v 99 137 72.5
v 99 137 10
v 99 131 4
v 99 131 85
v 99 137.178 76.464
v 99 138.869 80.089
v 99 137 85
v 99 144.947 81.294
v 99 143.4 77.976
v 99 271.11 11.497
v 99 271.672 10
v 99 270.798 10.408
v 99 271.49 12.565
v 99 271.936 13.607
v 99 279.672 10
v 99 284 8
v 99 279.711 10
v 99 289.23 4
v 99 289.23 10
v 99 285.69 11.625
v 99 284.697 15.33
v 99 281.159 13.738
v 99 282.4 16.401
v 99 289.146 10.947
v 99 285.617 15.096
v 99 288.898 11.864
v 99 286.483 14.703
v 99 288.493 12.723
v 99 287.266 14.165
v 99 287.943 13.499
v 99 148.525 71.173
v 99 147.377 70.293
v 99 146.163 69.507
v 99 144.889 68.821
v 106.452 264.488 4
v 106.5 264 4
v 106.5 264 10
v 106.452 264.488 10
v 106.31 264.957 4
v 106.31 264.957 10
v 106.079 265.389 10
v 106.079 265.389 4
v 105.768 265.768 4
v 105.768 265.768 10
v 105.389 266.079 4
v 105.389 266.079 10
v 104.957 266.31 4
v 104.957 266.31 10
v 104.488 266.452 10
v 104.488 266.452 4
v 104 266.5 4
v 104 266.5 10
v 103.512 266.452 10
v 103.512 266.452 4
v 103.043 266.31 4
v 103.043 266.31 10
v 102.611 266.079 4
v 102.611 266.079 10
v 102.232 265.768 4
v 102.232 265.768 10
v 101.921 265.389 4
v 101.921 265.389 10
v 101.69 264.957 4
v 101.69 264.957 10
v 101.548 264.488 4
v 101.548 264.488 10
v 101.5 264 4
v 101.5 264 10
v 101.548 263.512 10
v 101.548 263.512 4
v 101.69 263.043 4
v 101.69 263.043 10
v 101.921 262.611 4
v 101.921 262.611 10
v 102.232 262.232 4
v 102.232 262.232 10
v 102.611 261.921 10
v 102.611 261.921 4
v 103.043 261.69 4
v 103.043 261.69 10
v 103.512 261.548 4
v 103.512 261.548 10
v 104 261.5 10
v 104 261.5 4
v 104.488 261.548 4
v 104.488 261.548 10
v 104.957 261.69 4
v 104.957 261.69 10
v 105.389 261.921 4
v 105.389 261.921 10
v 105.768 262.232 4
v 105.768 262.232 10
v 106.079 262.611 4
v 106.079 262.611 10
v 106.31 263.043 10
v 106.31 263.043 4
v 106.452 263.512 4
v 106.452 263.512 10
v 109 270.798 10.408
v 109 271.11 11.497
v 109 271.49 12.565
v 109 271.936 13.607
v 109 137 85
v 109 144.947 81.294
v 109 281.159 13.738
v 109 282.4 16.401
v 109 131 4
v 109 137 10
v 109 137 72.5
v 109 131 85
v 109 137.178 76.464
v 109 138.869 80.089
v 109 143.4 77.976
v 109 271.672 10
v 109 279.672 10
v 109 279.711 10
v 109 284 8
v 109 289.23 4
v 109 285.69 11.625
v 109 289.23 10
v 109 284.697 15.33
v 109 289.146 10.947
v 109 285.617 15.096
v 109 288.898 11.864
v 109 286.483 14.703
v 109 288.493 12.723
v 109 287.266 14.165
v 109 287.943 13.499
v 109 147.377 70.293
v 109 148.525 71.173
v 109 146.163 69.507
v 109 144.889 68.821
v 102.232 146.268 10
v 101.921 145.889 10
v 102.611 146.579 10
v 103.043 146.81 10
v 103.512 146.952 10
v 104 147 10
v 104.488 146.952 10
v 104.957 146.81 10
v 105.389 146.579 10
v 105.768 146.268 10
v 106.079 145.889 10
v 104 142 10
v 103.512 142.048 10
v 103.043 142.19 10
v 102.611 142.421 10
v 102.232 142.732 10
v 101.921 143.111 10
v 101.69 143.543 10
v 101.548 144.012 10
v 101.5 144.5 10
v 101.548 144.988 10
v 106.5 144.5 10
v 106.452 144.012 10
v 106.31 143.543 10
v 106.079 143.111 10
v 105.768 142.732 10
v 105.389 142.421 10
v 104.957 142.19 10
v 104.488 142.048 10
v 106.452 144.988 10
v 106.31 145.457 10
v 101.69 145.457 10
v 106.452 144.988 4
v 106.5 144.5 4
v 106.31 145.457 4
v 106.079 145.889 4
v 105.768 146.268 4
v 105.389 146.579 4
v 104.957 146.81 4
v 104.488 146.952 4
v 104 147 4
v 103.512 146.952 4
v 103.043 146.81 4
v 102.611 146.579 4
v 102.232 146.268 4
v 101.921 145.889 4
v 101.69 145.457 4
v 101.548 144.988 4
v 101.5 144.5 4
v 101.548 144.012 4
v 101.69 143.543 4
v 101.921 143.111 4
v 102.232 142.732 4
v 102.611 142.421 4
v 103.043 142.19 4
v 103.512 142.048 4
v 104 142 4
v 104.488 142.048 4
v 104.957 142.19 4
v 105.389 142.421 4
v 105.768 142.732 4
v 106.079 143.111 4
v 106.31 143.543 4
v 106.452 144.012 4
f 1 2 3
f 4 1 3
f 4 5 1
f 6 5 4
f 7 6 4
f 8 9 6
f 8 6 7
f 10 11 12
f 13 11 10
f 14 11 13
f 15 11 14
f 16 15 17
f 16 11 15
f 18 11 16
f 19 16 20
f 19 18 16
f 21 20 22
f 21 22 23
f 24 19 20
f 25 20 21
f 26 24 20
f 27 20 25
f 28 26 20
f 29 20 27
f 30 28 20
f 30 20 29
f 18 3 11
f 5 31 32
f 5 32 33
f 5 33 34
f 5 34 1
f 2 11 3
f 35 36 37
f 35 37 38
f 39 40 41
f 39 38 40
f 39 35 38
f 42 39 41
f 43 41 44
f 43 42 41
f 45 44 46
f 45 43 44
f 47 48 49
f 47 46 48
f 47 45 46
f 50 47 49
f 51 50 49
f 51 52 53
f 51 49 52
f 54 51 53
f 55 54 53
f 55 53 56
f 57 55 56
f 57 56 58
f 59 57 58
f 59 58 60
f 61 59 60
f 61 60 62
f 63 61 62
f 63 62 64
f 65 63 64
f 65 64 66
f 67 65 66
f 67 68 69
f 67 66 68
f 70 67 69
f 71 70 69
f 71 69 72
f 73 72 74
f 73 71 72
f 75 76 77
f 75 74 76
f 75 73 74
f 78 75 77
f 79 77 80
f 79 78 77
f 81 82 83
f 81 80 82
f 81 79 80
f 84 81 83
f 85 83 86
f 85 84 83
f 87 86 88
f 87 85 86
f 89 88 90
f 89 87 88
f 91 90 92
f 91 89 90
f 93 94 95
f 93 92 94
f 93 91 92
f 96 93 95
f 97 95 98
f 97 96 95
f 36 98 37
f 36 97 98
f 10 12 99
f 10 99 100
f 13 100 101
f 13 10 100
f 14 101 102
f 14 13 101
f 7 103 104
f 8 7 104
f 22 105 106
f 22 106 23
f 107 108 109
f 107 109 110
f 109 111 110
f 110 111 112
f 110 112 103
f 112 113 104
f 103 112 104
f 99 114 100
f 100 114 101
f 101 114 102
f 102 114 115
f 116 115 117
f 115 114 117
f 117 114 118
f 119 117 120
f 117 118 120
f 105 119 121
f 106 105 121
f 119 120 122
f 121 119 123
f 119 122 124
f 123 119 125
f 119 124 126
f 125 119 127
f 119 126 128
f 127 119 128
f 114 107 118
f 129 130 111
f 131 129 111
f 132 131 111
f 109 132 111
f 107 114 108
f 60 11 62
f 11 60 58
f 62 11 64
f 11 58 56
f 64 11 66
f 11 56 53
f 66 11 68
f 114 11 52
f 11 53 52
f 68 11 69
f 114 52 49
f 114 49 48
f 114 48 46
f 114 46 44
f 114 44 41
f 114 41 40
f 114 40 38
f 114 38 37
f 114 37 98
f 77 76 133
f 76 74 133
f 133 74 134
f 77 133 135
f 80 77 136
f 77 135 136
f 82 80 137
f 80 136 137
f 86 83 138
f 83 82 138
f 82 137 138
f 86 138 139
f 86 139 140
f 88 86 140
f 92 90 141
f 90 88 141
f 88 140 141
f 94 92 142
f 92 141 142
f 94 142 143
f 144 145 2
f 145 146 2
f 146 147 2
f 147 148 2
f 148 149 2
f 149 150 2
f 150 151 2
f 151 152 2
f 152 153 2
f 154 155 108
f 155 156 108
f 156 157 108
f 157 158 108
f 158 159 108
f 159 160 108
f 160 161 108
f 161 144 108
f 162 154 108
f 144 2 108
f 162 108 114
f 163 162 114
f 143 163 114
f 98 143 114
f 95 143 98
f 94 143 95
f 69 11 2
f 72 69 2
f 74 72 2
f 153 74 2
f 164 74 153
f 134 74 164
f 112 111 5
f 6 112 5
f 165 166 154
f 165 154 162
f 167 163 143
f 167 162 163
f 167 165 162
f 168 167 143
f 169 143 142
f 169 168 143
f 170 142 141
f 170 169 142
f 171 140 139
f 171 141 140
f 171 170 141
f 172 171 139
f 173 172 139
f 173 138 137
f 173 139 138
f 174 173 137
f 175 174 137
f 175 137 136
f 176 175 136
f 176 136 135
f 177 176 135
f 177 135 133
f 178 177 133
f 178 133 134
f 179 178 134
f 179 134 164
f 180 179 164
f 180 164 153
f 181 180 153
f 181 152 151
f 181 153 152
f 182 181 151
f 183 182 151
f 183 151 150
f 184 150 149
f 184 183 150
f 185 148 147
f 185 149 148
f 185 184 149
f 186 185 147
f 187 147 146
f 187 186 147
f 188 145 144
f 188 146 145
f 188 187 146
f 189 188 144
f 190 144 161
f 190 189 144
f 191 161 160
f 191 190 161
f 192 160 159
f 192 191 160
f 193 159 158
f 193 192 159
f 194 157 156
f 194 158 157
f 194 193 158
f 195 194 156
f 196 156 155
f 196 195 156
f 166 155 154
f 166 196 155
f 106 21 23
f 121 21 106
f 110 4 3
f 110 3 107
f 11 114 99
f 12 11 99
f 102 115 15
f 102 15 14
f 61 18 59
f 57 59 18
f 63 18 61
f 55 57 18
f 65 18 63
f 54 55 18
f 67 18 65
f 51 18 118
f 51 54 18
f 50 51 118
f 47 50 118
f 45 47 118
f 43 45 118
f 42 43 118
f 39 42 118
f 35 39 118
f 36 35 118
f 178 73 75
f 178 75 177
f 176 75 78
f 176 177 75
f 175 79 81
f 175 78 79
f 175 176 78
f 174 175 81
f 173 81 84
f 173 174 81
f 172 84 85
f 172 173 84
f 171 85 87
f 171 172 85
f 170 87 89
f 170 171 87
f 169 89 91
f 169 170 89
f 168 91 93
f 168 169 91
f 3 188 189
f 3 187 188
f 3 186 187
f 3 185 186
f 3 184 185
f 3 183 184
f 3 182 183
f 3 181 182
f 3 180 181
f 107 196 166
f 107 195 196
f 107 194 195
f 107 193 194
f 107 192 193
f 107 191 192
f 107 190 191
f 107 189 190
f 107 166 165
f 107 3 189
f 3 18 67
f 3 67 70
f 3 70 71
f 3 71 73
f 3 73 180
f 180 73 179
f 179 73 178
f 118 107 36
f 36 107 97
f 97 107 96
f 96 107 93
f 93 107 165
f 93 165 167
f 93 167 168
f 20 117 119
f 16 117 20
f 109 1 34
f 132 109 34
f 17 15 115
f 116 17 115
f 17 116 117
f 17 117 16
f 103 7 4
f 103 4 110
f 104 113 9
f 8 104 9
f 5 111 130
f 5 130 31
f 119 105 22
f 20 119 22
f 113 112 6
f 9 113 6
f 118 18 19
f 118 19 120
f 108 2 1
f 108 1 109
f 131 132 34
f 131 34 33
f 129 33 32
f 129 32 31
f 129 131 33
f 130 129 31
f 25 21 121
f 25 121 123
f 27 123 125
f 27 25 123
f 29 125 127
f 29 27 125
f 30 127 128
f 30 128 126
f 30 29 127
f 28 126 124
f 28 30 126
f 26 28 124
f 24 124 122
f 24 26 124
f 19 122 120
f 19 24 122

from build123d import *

# Parameters (mm, degrees)
CYLINDER031_R          = 2.5
CYLINDER031_DEPTH      = 14
CYLINDER030_R          = 2.5
CYLINDER030_DEPTH      = 14
BOX012_W               = 134
BOX012_H               = 152
BOX012_DEPTH           = 11
BOX012_ROLL_ANGLE      = 25.000043
BOX012_PLACEMENT_ANGLE = 180
BOX011_W               = 10
BOX011_H               = 10
BOX011_DEPTH           = 10
BOX010_W               = 140
BOX010_H               = 162
BOX010_DEPTH           = 4
BOX010_ROLL_ANGLE      = 25.000043
BOX010_PLACEMENT_ANGLE = 180
CYLINDER004_W          = 5.4
CYLINDER004_H          = 10
CYLINDER004_ANGLE      = 90
BOX009_W               = 10
BOX009_H               = 6
BOX009_DEPTH           = 25
BOX009_PLACEMENT_ANGLE = 65
BOX008_W               = 10
BOX008_H               = 6
BOX008_DEPTH           = 31.23
BOX007_W               = 10
BOX007_H               = 2
BOX007_DEPTH           = 165
BOX002_W               = 140
BOX002_H               = 162
BOX002_DEPTH           = 4
BOX002_ROLL_ANGLE      = 25.000043
BOX002_PLACEMENT_ANGLE = 180
CYLINDER001_W          = 18
CYLINDER001_H          = 10
CYLINDER001_ANGLE      = 65
CYLINDER_W             = 18
CYLINDER_H             = 10
CYLINDER_ANGLE         = 65
BOX004_W               = 10
BOX004_H               = 6
BOX004_DEPTH           = 81
BOX006_W               = 10
BOX006_H               = 6
BOX006_DEPTH           = 20
CYLINDER003_W          = 18
CYLINDER003_H          = 10
CYLINDER003_ANGLE      = 25
CYLINDER002_W          = 18
CYLINDER002_H          = 10
CYLINDER002_ANGLE      = 25
BOX043_W               = 10
BOX043_H               = 109
BOX043_DEPTH           = 4


with BuildPart() as m4s008:
    # Cylinder031 → Cylinder031 (new body)
    with BuildSketch(Plane(origin=(105, 264, 0), x_dir=(1, 0, 0), z_dir=(0, 0, 1))):
        Circle(CYLINDER031_R)
    extrude(amount=CYLINDER031_DEPTH)


with BuildPart() as fusion015:
    # Cylinder030 → Cylinder030 (new body)
    with BuildSketch(Plane(origin=(105, 144.5, 0), x_dir=(1, 0, 0), z_dir=(0, 0, 1))):
        Circle(CYLINDER030_R)
    extrude(amount=CYLINDER030_DEPTH)

    # Fusion015: union m4s008
    add(m4s008.part)


with BuildPart() as solar_panelcut:
    # Box012 → Box012 (new body)
    with BuildSketch(Plane.XY):
        with Locations((67, 76)):
            Rectangle(BOX012_W, BOX012_H)
    extrude(amount=BOX012_DEPTH)


with BuildPart() as solar_panelcut_1:
    # Box012 roll: moved
    add(solar_panelcut.part.rotate(Axis((0, 0, 0), (1, 0, 0)), BOX012_ROLL_ANGLE))


with BuildPart() as solar_panelcut_2:
    # Box012 placement: moved
    add(solar_panelcut_1.part.moved(Location((175, 279.468463, 10.113095))).rotate(Axis((175, 279.468463, 10.113095), (0, 0, 1)), BOX012_PLACEMENT_ANGLE))


with BuildPart() as cube:
    # Box011 → Box011 (new body)
    with BuildSketch(Plane(origin=(100, 289.23, 0), x_dir=(1, 0, 0), z_dir=(0, 0, 1))):
        with Locations((5, 5)):
            Rectangle(BOX011_W, BOX011_H)
    extrude(amount=BOX011_DEPTH)


with BuildPart() as solar_panel004:
    # Box010 → Box010 (new body)
    with BuildSketch(Plane.XY):
        with Locations((70, 81)):
            Rectangle(BOX010_W, BOX010_H)
    extrude(amount=BOX010_DEPTH)


with BuildPart() as solar_panel004_1:
    # Box010 roll: moved
    add(solar_panel004.part.rotate(Axis((0, 0, 0), (1, 0, 0)), BOX010_ROLL_ANGLE))


with BuildPart() as solar_panel004_2:
    # Box010 placement: moved
    add(solar_panel004_1.part.moved(Location((175, 284, 8))).rotate(Axis((175, 284, 8), (0, 0, 1)), BOX010_PLACEMENT_ANGLE))


with BuildPart() as cylinder004:
    # Cylinder004 → Cylinder004 (revolve)
    with BuildSketch(Plane(origin=(110, 283.83, 10), x_dir=(0, 0, 1), z_dir=(0, -1, 0))):
        with Locations((2.7, 5)):
            Rectangle(CYLINDER004_W, CYLINDER004_H)
    revolve(axis=Axis((110, 283.83, 10), (-1, 0, 0)), revolution_arc=CYLINDER004_ANGLE)


with BuildPart() as basesupport007:
    # Box009 → Box009 (new body)
    with BuildSketch(Plane.XY):
        with Locations((5, 3)):
            Rectangle(BOX009_W, BOX009_H)
    extrude(amount=BOX009_DEPTH)


with BuildPart() as basesupport007_1:
    # Box009 placement: moved
    add(basesupport007.part.moved(Location((100, 284.507102, 8.798097))).rotate(Axis((100, 284.507102, 8.798097), (1, 0, 0)), BOX009_PLACEMENT_ANGLE))


with BuildPart() as basesupport006:
    # Box008 → Box008 (new body)
    with BuildSketch(Plane(origin=(100, 258, 10), x_dir=(1, 0, 0), z_dir=(0, 1, 0))):
        with Locations((5, 3)):
            Rectangle(BOX008_W, BOX008_H)
    extrude(amount=BOX008_DEPTH)


with BuildPart() as basesupport005:
    # Box007 → Box007 (new body)
    with BuildSketch(Plane(origin=(100, 131, 6), x_dir=(1, 0, 0), z_dir=(0, 1, 0))):
        with Locations((5, 1)):
            Rectangle(BOX007_W, BOX007_H)
    extrude(amount=BOX007_DEPTH)


with BuildPart() as solar_panel001:
    # Box002 → Box002 (new body)
    with BuildSketch(Plane.XY):
        with Locations((70, 81)):
            Rectangle(BOX002_W, BOX002_H)
    extrude(amount=BOX002_DEPTH)


with BuildPart() as solar_panel001_1:
    # Box002 roll: moved
    add(solar_panel001.part.rotate(Axis((0, 0, 0), (1, 0, 0)), BOX002_ROLL_ANGLE))


with BuildPart() as solar_panel001_2:
    # Box002 placement: moved
    add(solar_panel001_1.part.moved(Location((175, 284, 8))).rotate(Axis((175, 284, 8), (0, 0, 1)), BOX002_PLACEMENT_ANGLE))


with BuildPart() as cylinder001:
    # Cylinder001 → Cylinder001 (revolve)
    with BuildSketch(Plane(origin=(101, 137, 72.5), x_dir=(0, 0, -1), z_dir=(0, -1, 0))):
        with Locations((9, 5)):
            Rectangle(CYLINDER001_W, CYLINDER001_H)
    revolve(axis=Axis((101, 137, 72.5), (1, 0, 0)), revolution_arc=CYLINDER001_ANGLE)


with BuildPart() as basesupport001:
    # Cylinder → Cylinder (revolve)
    with BuildSketch(Plane(origin=(101, 137, 85), x_dir=(0, 0, -1), z_dir=(0, -1, 0))):
        with Locations((9, 5)):
            Rectangle(CYLINDER_W, CYLINDER_H)
    revolve(axis=Axis((101, 137, 85), (1, 0, 0)), revolution_arc=CYLINDER_ANGLE)

    # Cut: cut Cylinder001
    add(cylinder001.part, mode=Mode.SUBTRACT)


with BuildPart() as basesupport001_1:
    # Cut placement: moved
    add(basesupport001.part.moved(Location((-1, 0, 0))))


with BuildPart() as basesupport003:
    # Box004 → Box004 (new body)
    with BuildSketch(Plane(origin=(100, 131, 4), x_dir=(1, 0, 0), z_dir=(0, 0, 1))):
        with Locations((5, 3)):
            Rectangle(BOX004_W, BOX004_H)
    extrude(amount=BOX004_DEPTH)

    # Fusion: union baseSupport001
    add(basesupport001_1.part)

    # Cut001: cut solar Panel001
    add(solar_panel001_2.part, mode=Mode.SUBTRACT)


with BuildPart() as basesupport004:
    # Box006 → Box006 (new body)
    with BuildSketch(Plane(origin=(100, 131, 10), x_dir=(1, 0, 0), z_dir=(0, 1, 0))):
        with Locations((5, 3)):
            Rectangle(BOX006_W, BOX006_H)
    extrude(amount=BOX006_DEPTH)


with BuildPart() as cylinder003:
    # Cylinder003 → Cylinder003 (revolve)
    with BuildSketch(Plane(origin=(110, 280.25, 6), x_dir=(0, -1, 0), z_dir=(0, 0, -1))):
        with Locations((9, 5)):
            Rectangle(CYLINDER003_W, CYLINDER003_H)
    revolve(axis=Axis((110, 280.25, 6), (-1, 0, 0)), revolution_arc=CYLINDER003_ANGLE)


with BuildPart() as solarpanelbase001:
    # Cylinder002 → Cylinder002 (revolve)
    with BuildSketch(Plane(origin=(110, 288.25, 6), x_dir=(0, -1, 0), z_dir=(0, 0, -1))):
        with Locations((9, 5)):
            Rectangle(CYLINDER002_W, CYLINDER002_H)
    revolve(axis=Axis((110, 288.25, 6), (-1, 0, 0)), revolution_arc=CYLINDER002_ANGLE)

    # Cut002: cut Cylinder003
    add(cylinder003.part, mode=Mode.SUBTRACT)

    # Fusion001: union Cylinder004, baseSupport007, baseSupport006, baseSupport005, baseSupport003, baseSupport004
    add(cylinder004.part)
    add(basesupport007_1.part)
    add(basesupport006.part)
    add(basesupport005.part)
    add(basesupport003.part)
    add(basesupport004.part)

    # Cut003: cut solar Panel004
    add(solar_panel004_2.part, mode=Mode.SUBTRACT)

    # Cut004: cut Cube
    add(cube.part, mode=Mode.SUBTRACT)

    # Cut005: cut solar PanelCut
    add(solar_panelcut_2.part, mode=Mode.SUBTRACT)

    # Cut030: cut Fusion015
    add(fusion015.part, mode=Mode.SUBTRACT)


with BuildPart() as solarpanelbase001_1:
    # Cut030 placement: moved
    add(solarpanelbase001.part.moved(Location((-1, 0, 0))))


with BuildPart() as solarpanelbase004:
    # Box043 → Box043 (new body)
    with BuildSketch(Plane(origin=(99, 150, 6), x_dir=(1, 0, 0), z_dir=(0, 0, 1))):
        with Locations((5, 54.5)):
            Rectangle(BOX043_W, BOX043_H)
    extrude(amount=BOX043_DEPTH)

    # Fusion029: union solarPanelBase001
    add(solarpanelbase001_1.part)


solid = solarpanelbase004.part
